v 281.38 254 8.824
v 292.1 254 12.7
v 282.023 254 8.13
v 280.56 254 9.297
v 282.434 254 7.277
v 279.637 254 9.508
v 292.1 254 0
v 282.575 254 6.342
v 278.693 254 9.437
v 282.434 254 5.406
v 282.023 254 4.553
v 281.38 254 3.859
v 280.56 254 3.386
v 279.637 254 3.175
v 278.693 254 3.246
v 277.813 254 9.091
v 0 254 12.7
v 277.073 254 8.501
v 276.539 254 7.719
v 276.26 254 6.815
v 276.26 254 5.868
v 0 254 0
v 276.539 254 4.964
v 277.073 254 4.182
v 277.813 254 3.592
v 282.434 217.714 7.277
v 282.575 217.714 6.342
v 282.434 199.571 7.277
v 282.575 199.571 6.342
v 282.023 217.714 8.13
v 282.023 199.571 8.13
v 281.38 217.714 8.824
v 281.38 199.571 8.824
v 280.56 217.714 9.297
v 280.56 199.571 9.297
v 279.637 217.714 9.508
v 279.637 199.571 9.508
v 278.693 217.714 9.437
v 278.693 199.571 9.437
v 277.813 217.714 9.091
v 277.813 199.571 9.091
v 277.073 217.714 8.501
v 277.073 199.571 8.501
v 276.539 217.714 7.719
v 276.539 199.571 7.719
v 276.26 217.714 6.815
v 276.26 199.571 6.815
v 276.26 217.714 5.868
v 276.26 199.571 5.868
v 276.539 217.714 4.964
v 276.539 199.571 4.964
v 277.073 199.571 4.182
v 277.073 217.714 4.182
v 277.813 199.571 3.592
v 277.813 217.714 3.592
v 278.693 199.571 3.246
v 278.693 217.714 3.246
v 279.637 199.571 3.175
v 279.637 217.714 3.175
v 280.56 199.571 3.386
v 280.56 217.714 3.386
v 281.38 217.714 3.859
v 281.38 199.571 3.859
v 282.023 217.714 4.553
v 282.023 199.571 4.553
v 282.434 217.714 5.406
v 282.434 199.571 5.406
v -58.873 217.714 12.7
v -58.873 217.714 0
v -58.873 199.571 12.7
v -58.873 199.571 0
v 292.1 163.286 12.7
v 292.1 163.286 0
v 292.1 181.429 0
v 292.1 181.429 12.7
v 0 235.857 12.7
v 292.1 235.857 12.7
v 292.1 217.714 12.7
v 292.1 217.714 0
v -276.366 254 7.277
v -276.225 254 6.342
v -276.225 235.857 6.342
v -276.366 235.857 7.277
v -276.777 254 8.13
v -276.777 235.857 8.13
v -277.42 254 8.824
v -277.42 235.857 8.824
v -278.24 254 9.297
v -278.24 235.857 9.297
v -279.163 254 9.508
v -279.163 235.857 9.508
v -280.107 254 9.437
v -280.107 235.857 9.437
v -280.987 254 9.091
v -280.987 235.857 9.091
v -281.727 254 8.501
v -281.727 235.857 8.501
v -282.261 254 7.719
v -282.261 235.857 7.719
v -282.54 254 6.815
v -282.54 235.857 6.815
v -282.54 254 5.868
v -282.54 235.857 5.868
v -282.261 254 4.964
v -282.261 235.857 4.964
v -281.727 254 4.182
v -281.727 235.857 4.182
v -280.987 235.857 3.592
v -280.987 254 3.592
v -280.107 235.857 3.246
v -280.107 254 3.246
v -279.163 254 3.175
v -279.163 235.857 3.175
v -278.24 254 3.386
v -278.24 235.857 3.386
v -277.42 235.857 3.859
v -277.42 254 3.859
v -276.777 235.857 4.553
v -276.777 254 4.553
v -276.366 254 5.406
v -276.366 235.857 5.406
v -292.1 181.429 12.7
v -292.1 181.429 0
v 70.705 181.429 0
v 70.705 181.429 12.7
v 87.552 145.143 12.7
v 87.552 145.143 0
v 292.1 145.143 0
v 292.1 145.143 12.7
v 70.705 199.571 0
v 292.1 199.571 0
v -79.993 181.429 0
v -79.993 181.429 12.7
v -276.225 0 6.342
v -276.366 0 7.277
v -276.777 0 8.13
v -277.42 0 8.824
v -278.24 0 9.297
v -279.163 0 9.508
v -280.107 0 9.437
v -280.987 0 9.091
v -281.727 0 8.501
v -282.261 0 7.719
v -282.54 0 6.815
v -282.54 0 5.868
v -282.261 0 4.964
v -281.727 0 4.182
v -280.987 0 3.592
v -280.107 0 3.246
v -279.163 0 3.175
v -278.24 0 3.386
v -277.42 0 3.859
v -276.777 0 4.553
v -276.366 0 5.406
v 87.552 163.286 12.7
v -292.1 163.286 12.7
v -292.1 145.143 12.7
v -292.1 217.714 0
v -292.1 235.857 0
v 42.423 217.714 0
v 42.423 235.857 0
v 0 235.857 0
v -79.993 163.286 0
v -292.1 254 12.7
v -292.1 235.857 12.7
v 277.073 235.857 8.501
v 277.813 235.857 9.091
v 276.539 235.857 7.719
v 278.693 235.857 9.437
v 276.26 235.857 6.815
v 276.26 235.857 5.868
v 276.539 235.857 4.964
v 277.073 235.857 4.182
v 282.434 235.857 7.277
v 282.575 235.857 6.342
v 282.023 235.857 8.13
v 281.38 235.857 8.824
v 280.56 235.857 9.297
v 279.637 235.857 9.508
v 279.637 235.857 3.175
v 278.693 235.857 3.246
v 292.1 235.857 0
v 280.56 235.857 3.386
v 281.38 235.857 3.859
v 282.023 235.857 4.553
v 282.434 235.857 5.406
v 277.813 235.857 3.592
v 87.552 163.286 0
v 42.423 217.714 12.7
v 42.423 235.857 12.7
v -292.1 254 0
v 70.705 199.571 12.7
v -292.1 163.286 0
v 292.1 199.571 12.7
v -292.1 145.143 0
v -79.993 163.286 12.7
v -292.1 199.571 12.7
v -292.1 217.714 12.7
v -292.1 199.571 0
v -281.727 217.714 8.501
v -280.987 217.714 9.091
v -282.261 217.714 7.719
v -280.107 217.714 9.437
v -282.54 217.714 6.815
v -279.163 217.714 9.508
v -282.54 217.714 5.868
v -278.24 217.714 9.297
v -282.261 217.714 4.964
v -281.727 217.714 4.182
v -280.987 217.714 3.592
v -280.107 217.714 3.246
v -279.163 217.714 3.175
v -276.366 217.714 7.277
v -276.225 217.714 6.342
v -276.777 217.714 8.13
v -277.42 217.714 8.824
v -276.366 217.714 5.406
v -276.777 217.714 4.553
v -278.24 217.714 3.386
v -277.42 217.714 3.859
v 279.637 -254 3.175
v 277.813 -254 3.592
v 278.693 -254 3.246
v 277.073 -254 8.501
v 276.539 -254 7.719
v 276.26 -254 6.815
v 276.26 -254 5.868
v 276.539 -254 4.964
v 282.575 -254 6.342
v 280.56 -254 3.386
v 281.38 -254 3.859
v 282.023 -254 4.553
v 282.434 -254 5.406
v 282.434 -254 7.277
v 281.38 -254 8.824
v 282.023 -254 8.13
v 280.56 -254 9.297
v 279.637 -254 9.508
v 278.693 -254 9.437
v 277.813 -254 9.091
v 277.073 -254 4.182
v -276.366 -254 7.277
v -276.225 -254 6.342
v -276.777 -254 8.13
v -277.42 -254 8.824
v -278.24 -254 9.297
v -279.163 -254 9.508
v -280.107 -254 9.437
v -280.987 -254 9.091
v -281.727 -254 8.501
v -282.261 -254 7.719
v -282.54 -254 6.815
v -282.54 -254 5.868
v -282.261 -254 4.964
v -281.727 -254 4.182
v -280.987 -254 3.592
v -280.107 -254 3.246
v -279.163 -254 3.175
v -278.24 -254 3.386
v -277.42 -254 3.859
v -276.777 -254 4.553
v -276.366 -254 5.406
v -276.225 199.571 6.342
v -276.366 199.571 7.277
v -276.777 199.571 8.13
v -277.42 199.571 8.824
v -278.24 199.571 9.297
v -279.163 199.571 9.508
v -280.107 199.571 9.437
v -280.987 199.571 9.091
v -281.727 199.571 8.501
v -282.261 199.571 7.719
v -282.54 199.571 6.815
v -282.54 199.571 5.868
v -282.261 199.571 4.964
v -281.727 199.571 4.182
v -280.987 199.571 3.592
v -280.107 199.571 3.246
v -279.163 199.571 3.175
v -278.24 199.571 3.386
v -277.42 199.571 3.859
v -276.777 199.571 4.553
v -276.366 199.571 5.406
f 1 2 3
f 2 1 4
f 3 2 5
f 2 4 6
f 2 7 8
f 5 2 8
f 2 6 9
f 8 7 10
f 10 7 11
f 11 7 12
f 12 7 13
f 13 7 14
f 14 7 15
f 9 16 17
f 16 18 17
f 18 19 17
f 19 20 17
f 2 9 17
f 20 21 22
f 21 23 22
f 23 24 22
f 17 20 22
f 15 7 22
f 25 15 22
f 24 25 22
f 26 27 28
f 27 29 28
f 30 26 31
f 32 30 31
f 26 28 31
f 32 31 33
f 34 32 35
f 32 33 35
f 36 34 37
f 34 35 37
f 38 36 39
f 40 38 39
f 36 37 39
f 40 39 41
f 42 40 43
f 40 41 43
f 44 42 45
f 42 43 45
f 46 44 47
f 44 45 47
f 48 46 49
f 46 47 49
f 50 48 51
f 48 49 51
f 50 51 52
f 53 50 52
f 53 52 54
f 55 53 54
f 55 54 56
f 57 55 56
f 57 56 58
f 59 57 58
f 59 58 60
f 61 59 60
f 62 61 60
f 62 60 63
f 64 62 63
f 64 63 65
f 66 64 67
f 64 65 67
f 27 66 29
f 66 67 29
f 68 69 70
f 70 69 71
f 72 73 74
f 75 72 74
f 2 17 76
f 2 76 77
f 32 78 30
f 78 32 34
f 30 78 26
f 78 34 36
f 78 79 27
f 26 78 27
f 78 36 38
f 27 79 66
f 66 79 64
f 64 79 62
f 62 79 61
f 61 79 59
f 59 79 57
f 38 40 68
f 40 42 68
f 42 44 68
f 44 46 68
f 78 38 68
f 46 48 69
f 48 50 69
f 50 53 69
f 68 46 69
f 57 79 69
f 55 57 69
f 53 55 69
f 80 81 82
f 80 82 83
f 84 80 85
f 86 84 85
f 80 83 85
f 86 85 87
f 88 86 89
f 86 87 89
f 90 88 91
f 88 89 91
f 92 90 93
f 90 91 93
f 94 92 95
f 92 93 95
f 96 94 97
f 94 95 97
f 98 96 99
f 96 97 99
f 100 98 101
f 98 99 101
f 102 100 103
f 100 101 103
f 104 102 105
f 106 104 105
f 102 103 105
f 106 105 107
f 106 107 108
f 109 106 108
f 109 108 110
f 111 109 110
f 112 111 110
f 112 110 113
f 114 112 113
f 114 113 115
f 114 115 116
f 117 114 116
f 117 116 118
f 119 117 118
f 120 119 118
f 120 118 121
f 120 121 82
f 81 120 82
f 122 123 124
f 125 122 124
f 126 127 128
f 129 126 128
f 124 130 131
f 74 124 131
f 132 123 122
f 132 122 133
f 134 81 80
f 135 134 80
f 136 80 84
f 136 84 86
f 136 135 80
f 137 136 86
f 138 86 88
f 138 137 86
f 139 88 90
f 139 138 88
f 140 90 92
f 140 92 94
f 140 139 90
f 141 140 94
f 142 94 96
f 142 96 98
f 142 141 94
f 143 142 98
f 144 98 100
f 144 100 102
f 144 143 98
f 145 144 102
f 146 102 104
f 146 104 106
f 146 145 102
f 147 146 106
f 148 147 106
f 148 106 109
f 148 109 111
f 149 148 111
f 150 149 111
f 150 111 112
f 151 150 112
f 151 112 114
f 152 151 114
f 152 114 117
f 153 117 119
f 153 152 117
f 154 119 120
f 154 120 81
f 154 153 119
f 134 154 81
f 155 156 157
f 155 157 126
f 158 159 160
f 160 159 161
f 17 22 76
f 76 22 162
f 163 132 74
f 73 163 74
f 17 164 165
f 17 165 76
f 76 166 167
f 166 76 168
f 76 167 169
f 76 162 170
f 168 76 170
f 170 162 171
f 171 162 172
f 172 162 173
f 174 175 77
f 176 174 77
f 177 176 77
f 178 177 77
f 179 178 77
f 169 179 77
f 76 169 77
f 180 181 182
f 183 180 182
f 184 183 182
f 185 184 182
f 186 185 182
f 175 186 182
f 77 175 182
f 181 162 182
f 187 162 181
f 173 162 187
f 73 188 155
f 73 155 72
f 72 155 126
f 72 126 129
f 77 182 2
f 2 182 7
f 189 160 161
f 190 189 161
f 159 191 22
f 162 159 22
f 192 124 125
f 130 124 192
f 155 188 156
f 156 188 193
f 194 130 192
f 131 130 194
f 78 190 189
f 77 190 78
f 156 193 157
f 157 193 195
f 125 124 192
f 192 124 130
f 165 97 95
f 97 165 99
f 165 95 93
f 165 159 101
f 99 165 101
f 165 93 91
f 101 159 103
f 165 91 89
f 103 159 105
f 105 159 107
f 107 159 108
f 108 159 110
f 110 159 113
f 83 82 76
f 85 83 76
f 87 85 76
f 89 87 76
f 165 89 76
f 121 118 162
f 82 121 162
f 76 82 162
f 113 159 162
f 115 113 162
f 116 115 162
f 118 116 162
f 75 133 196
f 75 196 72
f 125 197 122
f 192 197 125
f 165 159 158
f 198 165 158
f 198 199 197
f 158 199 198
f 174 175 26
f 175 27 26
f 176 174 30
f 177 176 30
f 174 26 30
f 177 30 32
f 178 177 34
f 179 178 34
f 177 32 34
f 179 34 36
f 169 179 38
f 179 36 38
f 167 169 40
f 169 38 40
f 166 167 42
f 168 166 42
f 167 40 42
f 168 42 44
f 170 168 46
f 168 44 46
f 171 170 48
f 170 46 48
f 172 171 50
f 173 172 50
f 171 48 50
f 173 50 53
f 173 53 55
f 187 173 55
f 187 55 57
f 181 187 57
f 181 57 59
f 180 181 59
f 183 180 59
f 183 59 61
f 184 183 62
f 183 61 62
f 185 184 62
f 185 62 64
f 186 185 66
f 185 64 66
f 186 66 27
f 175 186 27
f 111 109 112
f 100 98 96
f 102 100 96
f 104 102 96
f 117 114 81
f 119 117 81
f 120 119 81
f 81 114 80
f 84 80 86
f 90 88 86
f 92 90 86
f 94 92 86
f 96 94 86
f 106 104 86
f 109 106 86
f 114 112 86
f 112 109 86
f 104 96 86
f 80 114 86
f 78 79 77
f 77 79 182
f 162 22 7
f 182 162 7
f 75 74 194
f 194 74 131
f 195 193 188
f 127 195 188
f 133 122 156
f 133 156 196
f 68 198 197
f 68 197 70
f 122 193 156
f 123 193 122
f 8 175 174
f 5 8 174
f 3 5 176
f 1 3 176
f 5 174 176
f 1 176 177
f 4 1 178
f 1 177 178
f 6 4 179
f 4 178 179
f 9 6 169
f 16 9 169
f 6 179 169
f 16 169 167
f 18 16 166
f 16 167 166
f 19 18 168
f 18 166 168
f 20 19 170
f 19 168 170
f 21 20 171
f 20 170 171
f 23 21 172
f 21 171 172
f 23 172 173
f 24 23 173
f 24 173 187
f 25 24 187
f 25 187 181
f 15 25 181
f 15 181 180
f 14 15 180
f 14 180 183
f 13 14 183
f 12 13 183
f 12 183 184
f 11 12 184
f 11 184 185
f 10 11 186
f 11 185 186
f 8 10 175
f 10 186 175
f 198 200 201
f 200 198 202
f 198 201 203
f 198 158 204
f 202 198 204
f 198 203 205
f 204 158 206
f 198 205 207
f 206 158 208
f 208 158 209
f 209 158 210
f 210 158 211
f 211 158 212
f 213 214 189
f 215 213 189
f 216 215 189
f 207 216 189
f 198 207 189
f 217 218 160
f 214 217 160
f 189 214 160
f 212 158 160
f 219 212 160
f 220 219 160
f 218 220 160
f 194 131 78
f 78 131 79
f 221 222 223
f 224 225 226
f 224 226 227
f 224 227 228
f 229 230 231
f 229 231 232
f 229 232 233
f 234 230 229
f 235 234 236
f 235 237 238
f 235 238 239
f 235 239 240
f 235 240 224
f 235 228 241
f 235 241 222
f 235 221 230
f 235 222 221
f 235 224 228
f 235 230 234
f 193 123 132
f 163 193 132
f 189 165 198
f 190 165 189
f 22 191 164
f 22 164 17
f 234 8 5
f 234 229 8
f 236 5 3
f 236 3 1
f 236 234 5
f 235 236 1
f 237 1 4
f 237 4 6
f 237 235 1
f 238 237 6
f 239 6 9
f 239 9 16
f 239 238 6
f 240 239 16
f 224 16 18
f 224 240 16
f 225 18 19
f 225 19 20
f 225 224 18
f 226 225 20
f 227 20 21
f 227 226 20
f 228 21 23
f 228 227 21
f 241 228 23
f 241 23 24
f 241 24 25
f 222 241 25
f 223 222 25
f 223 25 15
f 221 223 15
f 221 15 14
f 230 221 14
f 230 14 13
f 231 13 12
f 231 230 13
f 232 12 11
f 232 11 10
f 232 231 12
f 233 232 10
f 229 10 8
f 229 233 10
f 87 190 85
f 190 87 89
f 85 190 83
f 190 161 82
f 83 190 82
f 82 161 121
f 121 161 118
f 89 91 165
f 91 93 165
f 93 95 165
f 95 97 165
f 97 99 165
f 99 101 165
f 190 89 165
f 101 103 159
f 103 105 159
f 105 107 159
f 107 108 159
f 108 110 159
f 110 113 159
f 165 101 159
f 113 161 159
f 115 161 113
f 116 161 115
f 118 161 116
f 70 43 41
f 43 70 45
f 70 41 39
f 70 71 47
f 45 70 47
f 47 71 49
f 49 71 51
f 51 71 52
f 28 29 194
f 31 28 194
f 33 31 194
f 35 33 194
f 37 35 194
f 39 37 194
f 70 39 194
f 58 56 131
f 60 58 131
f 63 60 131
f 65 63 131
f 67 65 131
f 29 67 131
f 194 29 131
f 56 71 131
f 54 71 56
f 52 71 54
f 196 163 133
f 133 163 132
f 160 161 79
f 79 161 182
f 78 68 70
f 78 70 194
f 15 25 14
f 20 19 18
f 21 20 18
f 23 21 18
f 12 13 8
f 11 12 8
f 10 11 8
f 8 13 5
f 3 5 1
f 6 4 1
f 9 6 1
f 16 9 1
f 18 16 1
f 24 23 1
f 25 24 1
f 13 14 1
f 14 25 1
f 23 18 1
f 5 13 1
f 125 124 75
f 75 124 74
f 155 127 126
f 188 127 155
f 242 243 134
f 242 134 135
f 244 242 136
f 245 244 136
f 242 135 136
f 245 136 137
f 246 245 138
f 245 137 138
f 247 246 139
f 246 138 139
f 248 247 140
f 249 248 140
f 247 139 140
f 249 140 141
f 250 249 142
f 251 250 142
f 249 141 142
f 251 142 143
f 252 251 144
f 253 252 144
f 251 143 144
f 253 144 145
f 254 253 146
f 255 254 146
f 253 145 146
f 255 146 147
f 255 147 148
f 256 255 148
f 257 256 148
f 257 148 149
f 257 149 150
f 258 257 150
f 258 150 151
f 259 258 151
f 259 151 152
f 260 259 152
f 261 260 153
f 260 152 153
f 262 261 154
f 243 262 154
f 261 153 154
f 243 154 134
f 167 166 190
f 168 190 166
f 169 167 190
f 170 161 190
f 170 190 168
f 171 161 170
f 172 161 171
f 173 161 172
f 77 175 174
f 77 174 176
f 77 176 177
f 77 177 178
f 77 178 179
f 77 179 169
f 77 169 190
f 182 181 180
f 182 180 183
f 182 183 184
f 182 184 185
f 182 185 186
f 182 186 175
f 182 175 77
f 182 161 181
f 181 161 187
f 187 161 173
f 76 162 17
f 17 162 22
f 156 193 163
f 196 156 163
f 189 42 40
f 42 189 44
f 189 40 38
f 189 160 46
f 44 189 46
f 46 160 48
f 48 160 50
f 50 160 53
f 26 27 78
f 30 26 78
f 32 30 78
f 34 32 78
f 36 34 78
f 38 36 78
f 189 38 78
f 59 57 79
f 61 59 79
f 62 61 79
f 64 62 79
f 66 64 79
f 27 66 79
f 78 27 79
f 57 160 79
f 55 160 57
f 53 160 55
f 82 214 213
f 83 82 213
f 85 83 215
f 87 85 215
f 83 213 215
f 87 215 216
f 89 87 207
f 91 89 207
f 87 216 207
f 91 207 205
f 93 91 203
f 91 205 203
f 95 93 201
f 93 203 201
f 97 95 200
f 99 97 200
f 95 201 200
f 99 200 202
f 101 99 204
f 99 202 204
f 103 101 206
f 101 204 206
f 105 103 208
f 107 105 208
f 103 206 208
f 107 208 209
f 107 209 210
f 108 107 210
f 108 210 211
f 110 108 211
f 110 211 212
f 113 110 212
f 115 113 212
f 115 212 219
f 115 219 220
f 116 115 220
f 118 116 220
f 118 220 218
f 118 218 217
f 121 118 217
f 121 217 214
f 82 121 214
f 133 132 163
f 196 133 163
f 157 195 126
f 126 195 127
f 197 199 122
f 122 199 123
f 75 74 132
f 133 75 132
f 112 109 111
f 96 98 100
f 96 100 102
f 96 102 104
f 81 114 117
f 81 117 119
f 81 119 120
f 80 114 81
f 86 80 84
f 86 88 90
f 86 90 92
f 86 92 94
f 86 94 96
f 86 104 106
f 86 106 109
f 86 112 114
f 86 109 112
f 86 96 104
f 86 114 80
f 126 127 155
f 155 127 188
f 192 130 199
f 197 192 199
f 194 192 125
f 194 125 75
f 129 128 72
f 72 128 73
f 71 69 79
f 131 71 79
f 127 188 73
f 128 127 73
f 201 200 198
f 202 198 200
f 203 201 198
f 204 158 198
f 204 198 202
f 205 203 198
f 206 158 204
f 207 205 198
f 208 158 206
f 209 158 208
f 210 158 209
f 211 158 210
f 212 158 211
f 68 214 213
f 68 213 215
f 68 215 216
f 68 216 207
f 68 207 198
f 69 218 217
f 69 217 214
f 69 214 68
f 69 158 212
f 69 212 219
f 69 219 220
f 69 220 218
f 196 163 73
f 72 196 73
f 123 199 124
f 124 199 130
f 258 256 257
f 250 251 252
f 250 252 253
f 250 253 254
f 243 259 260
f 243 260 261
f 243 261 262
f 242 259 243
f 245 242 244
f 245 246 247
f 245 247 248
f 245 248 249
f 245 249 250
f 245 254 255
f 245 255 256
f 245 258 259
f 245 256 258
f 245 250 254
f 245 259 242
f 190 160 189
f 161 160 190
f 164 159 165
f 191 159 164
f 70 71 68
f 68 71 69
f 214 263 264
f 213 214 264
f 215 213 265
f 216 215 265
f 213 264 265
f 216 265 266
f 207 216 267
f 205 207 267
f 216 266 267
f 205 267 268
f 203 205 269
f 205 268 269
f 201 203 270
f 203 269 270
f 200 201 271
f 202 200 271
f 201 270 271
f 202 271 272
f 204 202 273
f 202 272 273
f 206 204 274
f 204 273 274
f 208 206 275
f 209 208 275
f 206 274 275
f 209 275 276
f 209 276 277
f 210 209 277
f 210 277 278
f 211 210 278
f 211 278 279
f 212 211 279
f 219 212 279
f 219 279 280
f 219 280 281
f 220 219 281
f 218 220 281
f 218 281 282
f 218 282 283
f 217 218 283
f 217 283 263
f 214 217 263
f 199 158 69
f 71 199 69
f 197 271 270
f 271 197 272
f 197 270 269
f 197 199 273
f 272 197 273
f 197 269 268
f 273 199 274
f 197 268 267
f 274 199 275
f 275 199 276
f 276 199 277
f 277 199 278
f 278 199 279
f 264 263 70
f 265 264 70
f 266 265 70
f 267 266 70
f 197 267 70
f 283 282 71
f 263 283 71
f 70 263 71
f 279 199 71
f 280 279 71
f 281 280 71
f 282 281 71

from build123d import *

# Parameters (mm, degrees)
F0_W      = 292.1
F0_H      = 18.142839
F1_DEPTH  = 12.7
F2_DEPTH  = 12.7
F0_W_2    = 233.226526
F3_DEPTH  = 12.7
F4_DEPTH  = 12.7
F0_W_3    = 249.677147
F5_DEPTH  = 12.7
F6_DEPTH  = 12.7
F7_R      = 3.175
F8_DEPTH  = 254
F10_DEPTH = 254
F11_DEPTH = 12.7
F0_W_4    = 221.395243
F12_DEPTH = 12.7
F0_W_5    = 212.106697
F13_DEPTH = 12.7
F14_DEPTH = 12.7
F15_DEPTH = 12.7
F0_W_6    = 204.547824
F16_DEPTH = 12.7


with BuildPart() as f1:
    # F0 (on Top) → F1 (new body)
    with BuildSketch(Plane.XY):
        with Locations((-146.05, 244.928581)):
            Rectangle(F0_W, F0_H)
    extrude(amount=F1_DEPTH)


with BuildPart() as f2:
    # F0 (on Top) → F2 (new body)
    with BuildSketch(Plane.XY):
        Polygon((42.422853, 235.857161), (0, 235.857161), (-292.1, 235.857161), (-292.1, 217.714322), (-58.873474, 217.714322), (42.422853, 217.714322), align=None)
    extrude(amount=F2_DEPTH)


with BuildPart() as f3:
    # F0 (on Top) → F3 (new body)
    with BuildSketch(Plane.XY):
        with Locations((-175.486737, 208.642902)):
            Rectangle(F0_W_2, F0_H)
    extrude(amount=F3_DEPTH)


with BuildPart() as f4:
    # F0 (on Top) → F4 (new body)
    with BuildSketch(Plane.XY):
        Polygon((292.1, 235.857161), (292.1, 254), (0, 254), (0, 235.857161), (42.422853, 235.857161), align=None)
    extrude(amount=F4_DEPTH)


with BuildPart() as f5:
    # F0 (on Top) → F5 (new body)
    with BuildSketch(Plane.XY):
        with Locations((167.261426, 226.785741)):
            Rectangle(F0_W_3, F0_H)
    extrude(amount=F5_DEPTH)


with BuildPart() as f6:
    # F0 (on Top) → F6 (new body)
    with BuildSketch(Plane.XY):
        Polygon((292.1, 199.571483), (292.1, 217.714322), (42.422853, 217.714322), (-58.873474, 217.714322), (-58.873474, 199.571483), (70.704757, 199.571483), align=None)
    extrude(amount=F6_DEPTH)


with BuildPart() as f8:
    # F7 (on Front) → F8 (new body, symmetric)
    with BuildSketch(Plane.XZ):
        with Locations((-279.4, 6.341596)):
            Circle(F7_R)
        with Locations((279.400003, 6.341596)):
            Circle(F7_R)
    extrude(amount=F8_DEPTH, both=True)


with BuildPart() as f3_1:
    add(f3.part)

    # F9: cut F8
    add(f8.part, mode=Mode.SUBTRACT)


with BuildPart() as f2_1:
    add(f2.part)

    # F9: cut F8
    add(f8.part, mode=Mode.SUBTRACT)


with BuildPart() as f1_1:
    add(f1.part)

    # F9: cut F8
    add(f8.part, mode=Mode.SUBTRACT)


with BuildPart() as f6_1:
    add(f6.part)

    # F9: cut F8
    add(f8.part, mode=Mode.SUBTRACT)


with BuildPart() as f5_1:
    add(f5.part)

    # F9: cut F8
    add(f8.part, mode=Mode.SUBTRACT)


with BuildPart() as f4_1:
    add(f4.part)

    # F9: cut F8
    add(f8.part, mode=Mode.SUBTRACT)


with BuildPart() as f10:
    # F7 (on Front) → F10 (new body, symmetric)
    with BuildSketch(Plane.XZ):
        with Locations((-279.4, 6.341596)):
            Circle(F7_R)
        with Locations((279.400003, 6.341596)):
            Circle(F7_R)
    extrude(amount=F10_DEPTH, both=True)


with BuildPart() as f11:
    # F0 (on Top) → F11 (new body)
    with BuildSketch(Plane.XY):
        Polygon((70.704757, 181.428644), (70.704757, 199.571483), (-58.873474, 199.571483), (-292.1, 199.571483), (-292.1, 181.428644), (-79.993303, 181.428644), align=None)
    extrude(amount=F11_DEPTH)


with BuildPart() as f12:
    # F0 (on Top) → F12 (new body)
    with BuildSketch(Plane.XY):
        with Locations((181.402378, 190.500064)):
            Rectangle(F0_W_4, F0_H)
    extrude(amount=F12_DEPTH)


with BuildPart() as f13:
    # F0 (on Top) → F13 (new body)
    with BuildSketch(Plane.XY):
        with Locations((-186.046651, 172.357224)):
            Rectangle(F0_W_5, F0_H)
    extrude(amount=F13_DEPTH)


with BuildPart() as f14:
    # F0 (on Top) → F14 (new body)
    with BuildSketch(Plane.XY):
        Polygon((292.1, 163.285805), (292.1, 181.428644), (70.704757, 181.428644), (-79.993303, 181.428644), (-79.993303, 163.285805), (87.552176, 163.285805), align=None)
    extrude(amount=F14_DEPTH)


with BuildPart() as f15:
    # F0 (on Top) → F15 (new body)
    with BuildSketch(Plane.XY):
        Polygon((87.552176, 145.142966), (87.552176, 163.285805), (-79.993303, 163.285805), (-292.1, 163.285805), (-292.1, 145.142966), (-93.800467, 145.142966), align=None)
    extrude(amount=F15_DEPTH)


with BuildPart() as f16:
    # F0 (on Top) → F16 (new body)
    with BuildSketch(Plane.XY):
        with Locations((189.826088, 154.214385)):
            Rectangle(F0_W_6, F0_H)
    extrude(amount=F16_DEPTH)


solid = Compound([f3_1.part, f2_1.part, f1_1.part, f6_1.part, f5_1.part, f4_1.part, f10.part, f11.part, f12.part, f13.part, f14.part, f15.part, f16.part])
